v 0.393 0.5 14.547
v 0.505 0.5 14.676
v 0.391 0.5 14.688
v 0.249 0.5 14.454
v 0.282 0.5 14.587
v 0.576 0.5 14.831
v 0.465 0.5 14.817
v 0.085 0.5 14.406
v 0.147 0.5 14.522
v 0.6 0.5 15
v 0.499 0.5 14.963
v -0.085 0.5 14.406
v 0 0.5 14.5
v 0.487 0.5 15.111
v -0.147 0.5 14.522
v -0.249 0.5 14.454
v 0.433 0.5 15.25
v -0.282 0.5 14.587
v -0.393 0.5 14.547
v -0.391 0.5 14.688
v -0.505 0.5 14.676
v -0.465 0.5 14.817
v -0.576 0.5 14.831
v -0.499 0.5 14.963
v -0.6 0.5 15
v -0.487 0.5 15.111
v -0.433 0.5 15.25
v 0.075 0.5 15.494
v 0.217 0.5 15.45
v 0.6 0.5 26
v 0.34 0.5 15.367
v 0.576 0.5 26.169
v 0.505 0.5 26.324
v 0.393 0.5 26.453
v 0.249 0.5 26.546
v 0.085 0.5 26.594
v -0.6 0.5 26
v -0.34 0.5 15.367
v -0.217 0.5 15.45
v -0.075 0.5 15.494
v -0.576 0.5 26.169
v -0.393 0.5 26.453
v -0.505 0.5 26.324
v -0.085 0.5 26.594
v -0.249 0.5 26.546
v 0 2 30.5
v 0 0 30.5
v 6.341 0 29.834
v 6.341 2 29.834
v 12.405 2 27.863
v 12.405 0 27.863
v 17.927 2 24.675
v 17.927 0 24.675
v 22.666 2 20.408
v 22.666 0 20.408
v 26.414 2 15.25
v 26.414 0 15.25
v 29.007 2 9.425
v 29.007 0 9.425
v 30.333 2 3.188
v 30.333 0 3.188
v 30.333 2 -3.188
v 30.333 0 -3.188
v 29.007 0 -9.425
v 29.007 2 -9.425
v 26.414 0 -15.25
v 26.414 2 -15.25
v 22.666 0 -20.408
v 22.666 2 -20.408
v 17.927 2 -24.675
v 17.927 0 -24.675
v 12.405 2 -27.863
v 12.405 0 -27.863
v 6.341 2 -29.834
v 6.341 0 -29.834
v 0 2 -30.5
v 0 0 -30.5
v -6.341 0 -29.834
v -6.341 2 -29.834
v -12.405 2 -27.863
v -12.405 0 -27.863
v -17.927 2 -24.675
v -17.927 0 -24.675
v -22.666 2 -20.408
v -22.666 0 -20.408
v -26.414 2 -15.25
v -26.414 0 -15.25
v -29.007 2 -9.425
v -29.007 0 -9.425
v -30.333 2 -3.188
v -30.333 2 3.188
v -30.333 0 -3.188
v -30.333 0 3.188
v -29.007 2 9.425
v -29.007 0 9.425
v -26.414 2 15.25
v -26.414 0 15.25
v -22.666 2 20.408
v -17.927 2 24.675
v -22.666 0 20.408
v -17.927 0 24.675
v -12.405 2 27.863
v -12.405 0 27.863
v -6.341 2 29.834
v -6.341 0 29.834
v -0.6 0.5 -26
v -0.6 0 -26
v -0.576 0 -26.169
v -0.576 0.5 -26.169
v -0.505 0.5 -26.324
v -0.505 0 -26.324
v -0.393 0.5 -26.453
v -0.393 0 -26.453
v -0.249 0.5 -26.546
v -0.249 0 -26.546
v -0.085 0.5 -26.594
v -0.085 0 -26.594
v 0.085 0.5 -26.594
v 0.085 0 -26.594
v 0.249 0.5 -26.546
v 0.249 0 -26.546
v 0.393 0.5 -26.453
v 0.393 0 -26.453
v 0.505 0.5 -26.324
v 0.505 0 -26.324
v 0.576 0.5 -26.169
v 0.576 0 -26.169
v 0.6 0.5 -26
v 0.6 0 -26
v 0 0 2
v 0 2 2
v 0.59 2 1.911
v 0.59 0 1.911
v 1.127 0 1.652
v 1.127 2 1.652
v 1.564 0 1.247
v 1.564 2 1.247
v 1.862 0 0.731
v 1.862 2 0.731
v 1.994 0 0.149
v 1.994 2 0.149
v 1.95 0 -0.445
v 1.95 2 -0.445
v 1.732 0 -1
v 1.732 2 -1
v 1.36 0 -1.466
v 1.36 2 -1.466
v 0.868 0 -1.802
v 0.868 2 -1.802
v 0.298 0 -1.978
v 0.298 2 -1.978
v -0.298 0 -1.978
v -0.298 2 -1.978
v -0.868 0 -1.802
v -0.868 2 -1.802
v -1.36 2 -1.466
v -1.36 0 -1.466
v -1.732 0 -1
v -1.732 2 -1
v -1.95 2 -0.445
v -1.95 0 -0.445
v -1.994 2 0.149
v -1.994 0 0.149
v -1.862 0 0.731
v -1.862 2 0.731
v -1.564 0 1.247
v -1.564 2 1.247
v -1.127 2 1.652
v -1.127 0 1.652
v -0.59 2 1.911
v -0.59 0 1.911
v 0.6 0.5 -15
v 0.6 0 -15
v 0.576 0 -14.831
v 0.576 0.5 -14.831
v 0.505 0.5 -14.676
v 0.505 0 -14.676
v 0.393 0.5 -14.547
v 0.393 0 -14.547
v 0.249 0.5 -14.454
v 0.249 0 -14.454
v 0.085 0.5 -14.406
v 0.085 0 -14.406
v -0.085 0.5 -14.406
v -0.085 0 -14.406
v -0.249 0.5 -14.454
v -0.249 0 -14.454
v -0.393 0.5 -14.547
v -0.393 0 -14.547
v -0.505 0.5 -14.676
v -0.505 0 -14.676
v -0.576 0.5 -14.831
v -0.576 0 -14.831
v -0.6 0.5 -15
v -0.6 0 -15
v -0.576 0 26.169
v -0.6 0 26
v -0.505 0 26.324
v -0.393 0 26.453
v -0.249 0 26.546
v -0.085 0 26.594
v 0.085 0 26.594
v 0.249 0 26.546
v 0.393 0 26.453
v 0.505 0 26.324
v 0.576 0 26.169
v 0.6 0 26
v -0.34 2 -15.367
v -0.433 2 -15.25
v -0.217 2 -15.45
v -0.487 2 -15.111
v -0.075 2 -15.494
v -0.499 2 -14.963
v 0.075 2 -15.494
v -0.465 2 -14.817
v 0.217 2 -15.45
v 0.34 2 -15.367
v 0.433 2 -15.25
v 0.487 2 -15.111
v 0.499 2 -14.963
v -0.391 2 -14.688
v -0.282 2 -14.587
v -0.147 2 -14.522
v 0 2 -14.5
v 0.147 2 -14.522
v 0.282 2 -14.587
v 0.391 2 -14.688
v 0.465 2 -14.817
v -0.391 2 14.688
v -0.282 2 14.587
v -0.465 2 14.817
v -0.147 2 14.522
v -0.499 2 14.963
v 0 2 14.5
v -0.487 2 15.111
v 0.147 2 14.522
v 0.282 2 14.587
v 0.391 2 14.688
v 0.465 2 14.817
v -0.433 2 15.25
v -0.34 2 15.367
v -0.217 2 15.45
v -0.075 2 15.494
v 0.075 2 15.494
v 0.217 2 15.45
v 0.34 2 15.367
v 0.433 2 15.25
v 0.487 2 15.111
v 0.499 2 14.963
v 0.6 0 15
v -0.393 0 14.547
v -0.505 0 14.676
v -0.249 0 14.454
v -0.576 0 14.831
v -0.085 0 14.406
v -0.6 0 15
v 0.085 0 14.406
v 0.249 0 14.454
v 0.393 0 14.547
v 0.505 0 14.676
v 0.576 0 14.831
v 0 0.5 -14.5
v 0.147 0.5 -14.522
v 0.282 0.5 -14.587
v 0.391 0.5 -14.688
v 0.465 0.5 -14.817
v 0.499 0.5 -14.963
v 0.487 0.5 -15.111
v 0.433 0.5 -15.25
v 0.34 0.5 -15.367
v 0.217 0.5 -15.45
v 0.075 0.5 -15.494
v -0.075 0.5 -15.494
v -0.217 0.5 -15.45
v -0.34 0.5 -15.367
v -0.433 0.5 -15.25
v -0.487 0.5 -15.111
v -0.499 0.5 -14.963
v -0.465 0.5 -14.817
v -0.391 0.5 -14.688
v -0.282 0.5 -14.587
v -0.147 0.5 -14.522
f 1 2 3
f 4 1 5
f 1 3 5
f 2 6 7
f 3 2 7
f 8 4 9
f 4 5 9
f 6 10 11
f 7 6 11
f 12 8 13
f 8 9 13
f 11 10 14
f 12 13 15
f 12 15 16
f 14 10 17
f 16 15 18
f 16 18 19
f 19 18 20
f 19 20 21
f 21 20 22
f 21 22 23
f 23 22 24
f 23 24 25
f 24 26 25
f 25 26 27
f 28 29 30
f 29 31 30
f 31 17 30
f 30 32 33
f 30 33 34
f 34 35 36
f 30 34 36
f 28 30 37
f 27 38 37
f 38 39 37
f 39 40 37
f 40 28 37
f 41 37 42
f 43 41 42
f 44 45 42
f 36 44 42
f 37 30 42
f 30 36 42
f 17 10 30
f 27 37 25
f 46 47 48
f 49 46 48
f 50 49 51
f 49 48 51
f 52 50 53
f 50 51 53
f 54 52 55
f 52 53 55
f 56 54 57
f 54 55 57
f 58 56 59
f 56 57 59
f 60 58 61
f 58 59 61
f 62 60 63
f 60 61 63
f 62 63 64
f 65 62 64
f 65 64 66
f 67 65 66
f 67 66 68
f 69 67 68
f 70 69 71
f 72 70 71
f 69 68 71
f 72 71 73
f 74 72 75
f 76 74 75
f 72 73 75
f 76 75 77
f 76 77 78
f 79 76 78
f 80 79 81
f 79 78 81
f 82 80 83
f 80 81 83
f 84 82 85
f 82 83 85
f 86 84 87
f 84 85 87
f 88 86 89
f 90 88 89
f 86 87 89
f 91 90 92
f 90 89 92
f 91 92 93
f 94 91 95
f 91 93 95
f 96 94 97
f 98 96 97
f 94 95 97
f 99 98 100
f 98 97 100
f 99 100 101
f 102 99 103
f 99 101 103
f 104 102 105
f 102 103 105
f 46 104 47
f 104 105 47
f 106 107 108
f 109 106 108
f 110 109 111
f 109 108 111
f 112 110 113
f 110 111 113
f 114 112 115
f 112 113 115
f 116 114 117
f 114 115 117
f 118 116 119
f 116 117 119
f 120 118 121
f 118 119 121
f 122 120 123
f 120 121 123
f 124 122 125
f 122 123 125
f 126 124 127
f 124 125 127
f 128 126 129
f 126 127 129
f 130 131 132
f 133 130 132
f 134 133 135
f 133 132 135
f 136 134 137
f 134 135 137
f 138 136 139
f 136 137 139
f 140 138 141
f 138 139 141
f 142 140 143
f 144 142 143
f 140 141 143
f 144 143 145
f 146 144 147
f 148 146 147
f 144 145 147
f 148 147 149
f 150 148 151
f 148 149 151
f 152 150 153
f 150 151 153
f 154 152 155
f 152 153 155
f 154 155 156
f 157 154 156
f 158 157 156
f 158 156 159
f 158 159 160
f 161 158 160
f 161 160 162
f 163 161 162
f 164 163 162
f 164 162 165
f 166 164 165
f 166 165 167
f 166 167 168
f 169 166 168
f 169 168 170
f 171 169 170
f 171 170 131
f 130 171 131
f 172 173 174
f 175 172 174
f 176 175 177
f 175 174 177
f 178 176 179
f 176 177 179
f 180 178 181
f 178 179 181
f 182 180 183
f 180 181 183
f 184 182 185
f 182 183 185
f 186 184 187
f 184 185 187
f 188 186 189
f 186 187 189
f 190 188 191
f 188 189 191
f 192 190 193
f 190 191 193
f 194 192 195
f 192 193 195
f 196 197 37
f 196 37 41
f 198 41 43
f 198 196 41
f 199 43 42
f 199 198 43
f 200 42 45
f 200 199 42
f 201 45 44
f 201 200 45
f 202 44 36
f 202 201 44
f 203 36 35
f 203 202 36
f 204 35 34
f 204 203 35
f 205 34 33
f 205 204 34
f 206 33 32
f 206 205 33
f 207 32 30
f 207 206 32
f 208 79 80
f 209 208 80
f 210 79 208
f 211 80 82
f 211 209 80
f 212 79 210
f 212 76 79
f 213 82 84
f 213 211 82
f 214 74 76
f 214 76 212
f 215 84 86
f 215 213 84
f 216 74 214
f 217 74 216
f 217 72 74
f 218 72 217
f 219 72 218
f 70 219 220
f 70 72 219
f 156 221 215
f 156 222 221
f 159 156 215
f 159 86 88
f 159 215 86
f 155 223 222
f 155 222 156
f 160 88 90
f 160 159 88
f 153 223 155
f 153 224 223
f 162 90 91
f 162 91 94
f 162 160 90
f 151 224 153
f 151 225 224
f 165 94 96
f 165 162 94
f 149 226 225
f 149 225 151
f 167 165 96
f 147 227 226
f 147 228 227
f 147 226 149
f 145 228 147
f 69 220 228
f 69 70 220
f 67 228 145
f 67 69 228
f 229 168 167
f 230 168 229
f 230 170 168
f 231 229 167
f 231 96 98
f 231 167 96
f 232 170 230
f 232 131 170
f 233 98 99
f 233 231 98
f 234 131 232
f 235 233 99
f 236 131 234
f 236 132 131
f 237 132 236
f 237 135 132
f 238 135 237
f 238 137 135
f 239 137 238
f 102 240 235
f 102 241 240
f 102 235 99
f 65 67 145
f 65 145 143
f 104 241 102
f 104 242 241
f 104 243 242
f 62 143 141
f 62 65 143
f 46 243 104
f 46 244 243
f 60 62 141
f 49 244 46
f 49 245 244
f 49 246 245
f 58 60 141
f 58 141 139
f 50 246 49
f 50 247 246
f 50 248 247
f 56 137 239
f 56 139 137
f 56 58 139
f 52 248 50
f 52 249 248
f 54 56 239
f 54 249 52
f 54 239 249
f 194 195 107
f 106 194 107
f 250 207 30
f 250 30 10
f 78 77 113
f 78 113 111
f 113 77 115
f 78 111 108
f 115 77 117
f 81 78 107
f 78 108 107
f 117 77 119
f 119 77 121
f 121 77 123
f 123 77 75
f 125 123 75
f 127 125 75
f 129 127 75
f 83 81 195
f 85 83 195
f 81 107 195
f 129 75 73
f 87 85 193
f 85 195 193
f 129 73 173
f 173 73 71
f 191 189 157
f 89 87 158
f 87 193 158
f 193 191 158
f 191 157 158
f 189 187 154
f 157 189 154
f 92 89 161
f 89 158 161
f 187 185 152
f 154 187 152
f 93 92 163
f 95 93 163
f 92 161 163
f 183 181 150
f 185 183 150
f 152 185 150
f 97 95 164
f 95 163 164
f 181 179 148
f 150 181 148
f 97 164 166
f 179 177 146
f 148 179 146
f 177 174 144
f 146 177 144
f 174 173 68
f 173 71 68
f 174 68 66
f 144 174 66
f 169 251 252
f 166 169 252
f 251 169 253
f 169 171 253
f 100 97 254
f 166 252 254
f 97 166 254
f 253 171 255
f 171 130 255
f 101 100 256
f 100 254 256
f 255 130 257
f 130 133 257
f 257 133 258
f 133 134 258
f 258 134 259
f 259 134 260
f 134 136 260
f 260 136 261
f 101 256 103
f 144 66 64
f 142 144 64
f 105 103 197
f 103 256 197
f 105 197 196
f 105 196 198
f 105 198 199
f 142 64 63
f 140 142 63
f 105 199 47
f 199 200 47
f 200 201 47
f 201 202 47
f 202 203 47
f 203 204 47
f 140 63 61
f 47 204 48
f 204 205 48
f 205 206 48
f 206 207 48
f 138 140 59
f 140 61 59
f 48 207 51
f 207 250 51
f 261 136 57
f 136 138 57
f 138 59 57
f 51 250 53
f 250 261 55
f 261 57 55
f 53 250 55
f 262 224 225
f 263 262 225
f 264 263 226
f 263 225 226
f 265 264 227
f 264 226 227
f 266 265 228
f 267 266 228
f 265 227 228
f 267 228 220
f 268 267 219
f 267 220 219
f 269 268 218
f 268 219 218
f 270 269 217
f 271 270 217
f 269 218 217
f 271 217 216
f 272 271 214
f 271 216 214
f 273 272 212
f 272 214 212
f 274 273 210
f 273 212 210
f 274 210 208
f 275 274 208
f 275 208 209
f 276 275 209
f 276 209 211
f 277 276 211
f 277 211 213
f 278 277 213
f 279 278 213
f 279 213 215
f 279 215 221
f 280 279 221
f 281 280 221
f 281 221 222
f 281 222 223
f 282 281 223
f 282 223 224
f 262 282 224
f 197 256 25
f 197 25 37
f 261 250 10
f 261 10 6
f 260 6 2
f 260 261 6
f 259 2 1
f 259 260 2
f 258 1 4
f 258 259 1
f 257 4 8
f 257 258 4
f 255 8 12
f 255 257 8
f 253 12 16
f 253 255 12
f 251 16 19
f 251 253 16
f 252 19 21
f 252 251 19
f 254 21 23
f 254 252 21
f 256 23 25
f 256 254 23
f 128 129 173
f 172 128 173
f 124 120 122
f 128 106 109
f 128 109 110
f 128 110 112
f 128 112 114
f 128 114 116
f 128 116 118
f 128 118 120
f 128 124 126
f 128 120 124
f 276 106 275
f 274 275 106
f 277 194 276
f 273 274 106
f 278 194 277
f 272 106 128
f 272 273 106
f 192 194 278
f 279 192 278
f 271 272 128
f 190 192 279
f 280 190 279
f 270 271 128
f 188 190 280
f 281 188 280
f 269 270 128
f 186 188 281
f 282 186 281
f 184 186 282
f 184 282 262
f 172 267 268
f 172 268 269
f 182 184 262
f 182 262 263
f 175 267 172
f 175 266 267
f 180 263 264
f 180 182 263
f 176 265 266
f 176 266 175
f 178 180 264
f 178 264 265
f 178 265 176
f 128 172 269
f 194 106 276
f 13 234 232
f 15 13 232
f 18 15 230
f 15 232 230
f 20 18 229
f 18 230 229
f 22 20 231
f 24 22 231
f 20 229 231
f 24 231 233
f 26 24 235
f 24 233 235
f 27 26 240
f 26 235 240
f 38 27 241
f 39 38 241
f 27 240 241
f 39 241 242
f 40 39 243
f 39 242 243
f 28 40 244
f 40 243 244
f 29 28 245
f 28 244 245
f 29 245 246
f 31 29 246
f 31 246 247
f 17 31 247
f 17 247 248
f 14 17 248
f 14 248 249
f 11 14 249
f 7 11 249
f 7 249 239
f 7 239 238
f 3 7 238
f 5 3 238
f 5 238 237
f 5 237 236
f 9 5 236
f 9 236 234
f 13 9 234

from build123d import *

# Parameters (mm, degrees)
SKETCH1_R           = 30.5
BOSS_EXTRUDE1_DEPTH = 2
SKETCH2_R           = 2
CUT_EXTRUDE1_DEPTH  = 44.179856415
SKETCH4_R           = 0.5
CUT_EXTRUDE2_DEPTH  = 44.179856415
CUT_EXTRUDE3_DEPTH  = 0.5


with BuildPart() as part:
    # Sketch1 → Boss-Extrude1 (new body)
    with BuildSketch(Plane(origin=(0, 0, 0), x_dir=(1, 0, 0), z_dir=(0, 1, 0))):
        with Locations(Location((0, 0, 0), (0, 0, 270))):
            Circle(SKETCH1_R)
    extrude(amount=BOSS_EXTRUDE1_DEPTH)

    # Sketch2 → Cut-Extrude1 (cut, through all)
    with BuildSketch(Plane(origin=(0, 2, 0), x_dir=(1, 0, 0), z_dir=(0, 1, 0))):
        with Locations(Location((0, 0, 0), (0, 0, 270))):
            Circle(SKETCH2_R)
    extrude(amount=-CUT_EXTRUDE1_DEPTH, mode=Mode.SUBTRACT)

    # Sketch4 → Cut-Extrude2 (cut, through all)
    with BuildSketch(Plane(origin=(0, 2, 0), x_dir=(1, 0, 0), z_dir=(0, 1, 0))):
        with Locations(Location((0, 15, 0), (0, 0, 270))):
            Circle(SKETCH4_R)
        with Locations(Location((0, -15, 0), (0, 0, 90))):
            Circle(SKETCH4_R)
    extrude(amount=-CUT_EXTRUDE2_DEPTH, mode=Mode.SUBTRACT)

    # Sketch5 → Cut-Extrude3 (cut)
    with BuildSketch(Plane.XZ):
        with BuildLine():
            Line((0.599999999, 26), (0.599999999, 15))
            ThreePointArc((0.599999999, 15), (0, 14.400000002), (-0.599999999, 15))
            Line((-0.599999999, 15), (-0.599999999, 26))
            ThreePointArc((-0.599999999, 26), (0, 26.599999999), (0.599999999, 26))
        make_face()
        with BuildLine():
            Line((0.599999999, -26), (0.599999999, -15.000000001))
            ThreePointArc((0.599999999, -15.000000001), (0, -14.400000003), (-0.599999999, -15.000000001))
            Line((-0.599999999, -15.000000001), (-0.599999999, -26))
            ThreePointArc((-0.599999999, -26), (0, -26.6), (0.599999999, -26))
        make_face()
    extrude(amount=-CUT_EXTRUDE3_DEPTH, mode=Mode.SUBTRACT)


solid = part.part
